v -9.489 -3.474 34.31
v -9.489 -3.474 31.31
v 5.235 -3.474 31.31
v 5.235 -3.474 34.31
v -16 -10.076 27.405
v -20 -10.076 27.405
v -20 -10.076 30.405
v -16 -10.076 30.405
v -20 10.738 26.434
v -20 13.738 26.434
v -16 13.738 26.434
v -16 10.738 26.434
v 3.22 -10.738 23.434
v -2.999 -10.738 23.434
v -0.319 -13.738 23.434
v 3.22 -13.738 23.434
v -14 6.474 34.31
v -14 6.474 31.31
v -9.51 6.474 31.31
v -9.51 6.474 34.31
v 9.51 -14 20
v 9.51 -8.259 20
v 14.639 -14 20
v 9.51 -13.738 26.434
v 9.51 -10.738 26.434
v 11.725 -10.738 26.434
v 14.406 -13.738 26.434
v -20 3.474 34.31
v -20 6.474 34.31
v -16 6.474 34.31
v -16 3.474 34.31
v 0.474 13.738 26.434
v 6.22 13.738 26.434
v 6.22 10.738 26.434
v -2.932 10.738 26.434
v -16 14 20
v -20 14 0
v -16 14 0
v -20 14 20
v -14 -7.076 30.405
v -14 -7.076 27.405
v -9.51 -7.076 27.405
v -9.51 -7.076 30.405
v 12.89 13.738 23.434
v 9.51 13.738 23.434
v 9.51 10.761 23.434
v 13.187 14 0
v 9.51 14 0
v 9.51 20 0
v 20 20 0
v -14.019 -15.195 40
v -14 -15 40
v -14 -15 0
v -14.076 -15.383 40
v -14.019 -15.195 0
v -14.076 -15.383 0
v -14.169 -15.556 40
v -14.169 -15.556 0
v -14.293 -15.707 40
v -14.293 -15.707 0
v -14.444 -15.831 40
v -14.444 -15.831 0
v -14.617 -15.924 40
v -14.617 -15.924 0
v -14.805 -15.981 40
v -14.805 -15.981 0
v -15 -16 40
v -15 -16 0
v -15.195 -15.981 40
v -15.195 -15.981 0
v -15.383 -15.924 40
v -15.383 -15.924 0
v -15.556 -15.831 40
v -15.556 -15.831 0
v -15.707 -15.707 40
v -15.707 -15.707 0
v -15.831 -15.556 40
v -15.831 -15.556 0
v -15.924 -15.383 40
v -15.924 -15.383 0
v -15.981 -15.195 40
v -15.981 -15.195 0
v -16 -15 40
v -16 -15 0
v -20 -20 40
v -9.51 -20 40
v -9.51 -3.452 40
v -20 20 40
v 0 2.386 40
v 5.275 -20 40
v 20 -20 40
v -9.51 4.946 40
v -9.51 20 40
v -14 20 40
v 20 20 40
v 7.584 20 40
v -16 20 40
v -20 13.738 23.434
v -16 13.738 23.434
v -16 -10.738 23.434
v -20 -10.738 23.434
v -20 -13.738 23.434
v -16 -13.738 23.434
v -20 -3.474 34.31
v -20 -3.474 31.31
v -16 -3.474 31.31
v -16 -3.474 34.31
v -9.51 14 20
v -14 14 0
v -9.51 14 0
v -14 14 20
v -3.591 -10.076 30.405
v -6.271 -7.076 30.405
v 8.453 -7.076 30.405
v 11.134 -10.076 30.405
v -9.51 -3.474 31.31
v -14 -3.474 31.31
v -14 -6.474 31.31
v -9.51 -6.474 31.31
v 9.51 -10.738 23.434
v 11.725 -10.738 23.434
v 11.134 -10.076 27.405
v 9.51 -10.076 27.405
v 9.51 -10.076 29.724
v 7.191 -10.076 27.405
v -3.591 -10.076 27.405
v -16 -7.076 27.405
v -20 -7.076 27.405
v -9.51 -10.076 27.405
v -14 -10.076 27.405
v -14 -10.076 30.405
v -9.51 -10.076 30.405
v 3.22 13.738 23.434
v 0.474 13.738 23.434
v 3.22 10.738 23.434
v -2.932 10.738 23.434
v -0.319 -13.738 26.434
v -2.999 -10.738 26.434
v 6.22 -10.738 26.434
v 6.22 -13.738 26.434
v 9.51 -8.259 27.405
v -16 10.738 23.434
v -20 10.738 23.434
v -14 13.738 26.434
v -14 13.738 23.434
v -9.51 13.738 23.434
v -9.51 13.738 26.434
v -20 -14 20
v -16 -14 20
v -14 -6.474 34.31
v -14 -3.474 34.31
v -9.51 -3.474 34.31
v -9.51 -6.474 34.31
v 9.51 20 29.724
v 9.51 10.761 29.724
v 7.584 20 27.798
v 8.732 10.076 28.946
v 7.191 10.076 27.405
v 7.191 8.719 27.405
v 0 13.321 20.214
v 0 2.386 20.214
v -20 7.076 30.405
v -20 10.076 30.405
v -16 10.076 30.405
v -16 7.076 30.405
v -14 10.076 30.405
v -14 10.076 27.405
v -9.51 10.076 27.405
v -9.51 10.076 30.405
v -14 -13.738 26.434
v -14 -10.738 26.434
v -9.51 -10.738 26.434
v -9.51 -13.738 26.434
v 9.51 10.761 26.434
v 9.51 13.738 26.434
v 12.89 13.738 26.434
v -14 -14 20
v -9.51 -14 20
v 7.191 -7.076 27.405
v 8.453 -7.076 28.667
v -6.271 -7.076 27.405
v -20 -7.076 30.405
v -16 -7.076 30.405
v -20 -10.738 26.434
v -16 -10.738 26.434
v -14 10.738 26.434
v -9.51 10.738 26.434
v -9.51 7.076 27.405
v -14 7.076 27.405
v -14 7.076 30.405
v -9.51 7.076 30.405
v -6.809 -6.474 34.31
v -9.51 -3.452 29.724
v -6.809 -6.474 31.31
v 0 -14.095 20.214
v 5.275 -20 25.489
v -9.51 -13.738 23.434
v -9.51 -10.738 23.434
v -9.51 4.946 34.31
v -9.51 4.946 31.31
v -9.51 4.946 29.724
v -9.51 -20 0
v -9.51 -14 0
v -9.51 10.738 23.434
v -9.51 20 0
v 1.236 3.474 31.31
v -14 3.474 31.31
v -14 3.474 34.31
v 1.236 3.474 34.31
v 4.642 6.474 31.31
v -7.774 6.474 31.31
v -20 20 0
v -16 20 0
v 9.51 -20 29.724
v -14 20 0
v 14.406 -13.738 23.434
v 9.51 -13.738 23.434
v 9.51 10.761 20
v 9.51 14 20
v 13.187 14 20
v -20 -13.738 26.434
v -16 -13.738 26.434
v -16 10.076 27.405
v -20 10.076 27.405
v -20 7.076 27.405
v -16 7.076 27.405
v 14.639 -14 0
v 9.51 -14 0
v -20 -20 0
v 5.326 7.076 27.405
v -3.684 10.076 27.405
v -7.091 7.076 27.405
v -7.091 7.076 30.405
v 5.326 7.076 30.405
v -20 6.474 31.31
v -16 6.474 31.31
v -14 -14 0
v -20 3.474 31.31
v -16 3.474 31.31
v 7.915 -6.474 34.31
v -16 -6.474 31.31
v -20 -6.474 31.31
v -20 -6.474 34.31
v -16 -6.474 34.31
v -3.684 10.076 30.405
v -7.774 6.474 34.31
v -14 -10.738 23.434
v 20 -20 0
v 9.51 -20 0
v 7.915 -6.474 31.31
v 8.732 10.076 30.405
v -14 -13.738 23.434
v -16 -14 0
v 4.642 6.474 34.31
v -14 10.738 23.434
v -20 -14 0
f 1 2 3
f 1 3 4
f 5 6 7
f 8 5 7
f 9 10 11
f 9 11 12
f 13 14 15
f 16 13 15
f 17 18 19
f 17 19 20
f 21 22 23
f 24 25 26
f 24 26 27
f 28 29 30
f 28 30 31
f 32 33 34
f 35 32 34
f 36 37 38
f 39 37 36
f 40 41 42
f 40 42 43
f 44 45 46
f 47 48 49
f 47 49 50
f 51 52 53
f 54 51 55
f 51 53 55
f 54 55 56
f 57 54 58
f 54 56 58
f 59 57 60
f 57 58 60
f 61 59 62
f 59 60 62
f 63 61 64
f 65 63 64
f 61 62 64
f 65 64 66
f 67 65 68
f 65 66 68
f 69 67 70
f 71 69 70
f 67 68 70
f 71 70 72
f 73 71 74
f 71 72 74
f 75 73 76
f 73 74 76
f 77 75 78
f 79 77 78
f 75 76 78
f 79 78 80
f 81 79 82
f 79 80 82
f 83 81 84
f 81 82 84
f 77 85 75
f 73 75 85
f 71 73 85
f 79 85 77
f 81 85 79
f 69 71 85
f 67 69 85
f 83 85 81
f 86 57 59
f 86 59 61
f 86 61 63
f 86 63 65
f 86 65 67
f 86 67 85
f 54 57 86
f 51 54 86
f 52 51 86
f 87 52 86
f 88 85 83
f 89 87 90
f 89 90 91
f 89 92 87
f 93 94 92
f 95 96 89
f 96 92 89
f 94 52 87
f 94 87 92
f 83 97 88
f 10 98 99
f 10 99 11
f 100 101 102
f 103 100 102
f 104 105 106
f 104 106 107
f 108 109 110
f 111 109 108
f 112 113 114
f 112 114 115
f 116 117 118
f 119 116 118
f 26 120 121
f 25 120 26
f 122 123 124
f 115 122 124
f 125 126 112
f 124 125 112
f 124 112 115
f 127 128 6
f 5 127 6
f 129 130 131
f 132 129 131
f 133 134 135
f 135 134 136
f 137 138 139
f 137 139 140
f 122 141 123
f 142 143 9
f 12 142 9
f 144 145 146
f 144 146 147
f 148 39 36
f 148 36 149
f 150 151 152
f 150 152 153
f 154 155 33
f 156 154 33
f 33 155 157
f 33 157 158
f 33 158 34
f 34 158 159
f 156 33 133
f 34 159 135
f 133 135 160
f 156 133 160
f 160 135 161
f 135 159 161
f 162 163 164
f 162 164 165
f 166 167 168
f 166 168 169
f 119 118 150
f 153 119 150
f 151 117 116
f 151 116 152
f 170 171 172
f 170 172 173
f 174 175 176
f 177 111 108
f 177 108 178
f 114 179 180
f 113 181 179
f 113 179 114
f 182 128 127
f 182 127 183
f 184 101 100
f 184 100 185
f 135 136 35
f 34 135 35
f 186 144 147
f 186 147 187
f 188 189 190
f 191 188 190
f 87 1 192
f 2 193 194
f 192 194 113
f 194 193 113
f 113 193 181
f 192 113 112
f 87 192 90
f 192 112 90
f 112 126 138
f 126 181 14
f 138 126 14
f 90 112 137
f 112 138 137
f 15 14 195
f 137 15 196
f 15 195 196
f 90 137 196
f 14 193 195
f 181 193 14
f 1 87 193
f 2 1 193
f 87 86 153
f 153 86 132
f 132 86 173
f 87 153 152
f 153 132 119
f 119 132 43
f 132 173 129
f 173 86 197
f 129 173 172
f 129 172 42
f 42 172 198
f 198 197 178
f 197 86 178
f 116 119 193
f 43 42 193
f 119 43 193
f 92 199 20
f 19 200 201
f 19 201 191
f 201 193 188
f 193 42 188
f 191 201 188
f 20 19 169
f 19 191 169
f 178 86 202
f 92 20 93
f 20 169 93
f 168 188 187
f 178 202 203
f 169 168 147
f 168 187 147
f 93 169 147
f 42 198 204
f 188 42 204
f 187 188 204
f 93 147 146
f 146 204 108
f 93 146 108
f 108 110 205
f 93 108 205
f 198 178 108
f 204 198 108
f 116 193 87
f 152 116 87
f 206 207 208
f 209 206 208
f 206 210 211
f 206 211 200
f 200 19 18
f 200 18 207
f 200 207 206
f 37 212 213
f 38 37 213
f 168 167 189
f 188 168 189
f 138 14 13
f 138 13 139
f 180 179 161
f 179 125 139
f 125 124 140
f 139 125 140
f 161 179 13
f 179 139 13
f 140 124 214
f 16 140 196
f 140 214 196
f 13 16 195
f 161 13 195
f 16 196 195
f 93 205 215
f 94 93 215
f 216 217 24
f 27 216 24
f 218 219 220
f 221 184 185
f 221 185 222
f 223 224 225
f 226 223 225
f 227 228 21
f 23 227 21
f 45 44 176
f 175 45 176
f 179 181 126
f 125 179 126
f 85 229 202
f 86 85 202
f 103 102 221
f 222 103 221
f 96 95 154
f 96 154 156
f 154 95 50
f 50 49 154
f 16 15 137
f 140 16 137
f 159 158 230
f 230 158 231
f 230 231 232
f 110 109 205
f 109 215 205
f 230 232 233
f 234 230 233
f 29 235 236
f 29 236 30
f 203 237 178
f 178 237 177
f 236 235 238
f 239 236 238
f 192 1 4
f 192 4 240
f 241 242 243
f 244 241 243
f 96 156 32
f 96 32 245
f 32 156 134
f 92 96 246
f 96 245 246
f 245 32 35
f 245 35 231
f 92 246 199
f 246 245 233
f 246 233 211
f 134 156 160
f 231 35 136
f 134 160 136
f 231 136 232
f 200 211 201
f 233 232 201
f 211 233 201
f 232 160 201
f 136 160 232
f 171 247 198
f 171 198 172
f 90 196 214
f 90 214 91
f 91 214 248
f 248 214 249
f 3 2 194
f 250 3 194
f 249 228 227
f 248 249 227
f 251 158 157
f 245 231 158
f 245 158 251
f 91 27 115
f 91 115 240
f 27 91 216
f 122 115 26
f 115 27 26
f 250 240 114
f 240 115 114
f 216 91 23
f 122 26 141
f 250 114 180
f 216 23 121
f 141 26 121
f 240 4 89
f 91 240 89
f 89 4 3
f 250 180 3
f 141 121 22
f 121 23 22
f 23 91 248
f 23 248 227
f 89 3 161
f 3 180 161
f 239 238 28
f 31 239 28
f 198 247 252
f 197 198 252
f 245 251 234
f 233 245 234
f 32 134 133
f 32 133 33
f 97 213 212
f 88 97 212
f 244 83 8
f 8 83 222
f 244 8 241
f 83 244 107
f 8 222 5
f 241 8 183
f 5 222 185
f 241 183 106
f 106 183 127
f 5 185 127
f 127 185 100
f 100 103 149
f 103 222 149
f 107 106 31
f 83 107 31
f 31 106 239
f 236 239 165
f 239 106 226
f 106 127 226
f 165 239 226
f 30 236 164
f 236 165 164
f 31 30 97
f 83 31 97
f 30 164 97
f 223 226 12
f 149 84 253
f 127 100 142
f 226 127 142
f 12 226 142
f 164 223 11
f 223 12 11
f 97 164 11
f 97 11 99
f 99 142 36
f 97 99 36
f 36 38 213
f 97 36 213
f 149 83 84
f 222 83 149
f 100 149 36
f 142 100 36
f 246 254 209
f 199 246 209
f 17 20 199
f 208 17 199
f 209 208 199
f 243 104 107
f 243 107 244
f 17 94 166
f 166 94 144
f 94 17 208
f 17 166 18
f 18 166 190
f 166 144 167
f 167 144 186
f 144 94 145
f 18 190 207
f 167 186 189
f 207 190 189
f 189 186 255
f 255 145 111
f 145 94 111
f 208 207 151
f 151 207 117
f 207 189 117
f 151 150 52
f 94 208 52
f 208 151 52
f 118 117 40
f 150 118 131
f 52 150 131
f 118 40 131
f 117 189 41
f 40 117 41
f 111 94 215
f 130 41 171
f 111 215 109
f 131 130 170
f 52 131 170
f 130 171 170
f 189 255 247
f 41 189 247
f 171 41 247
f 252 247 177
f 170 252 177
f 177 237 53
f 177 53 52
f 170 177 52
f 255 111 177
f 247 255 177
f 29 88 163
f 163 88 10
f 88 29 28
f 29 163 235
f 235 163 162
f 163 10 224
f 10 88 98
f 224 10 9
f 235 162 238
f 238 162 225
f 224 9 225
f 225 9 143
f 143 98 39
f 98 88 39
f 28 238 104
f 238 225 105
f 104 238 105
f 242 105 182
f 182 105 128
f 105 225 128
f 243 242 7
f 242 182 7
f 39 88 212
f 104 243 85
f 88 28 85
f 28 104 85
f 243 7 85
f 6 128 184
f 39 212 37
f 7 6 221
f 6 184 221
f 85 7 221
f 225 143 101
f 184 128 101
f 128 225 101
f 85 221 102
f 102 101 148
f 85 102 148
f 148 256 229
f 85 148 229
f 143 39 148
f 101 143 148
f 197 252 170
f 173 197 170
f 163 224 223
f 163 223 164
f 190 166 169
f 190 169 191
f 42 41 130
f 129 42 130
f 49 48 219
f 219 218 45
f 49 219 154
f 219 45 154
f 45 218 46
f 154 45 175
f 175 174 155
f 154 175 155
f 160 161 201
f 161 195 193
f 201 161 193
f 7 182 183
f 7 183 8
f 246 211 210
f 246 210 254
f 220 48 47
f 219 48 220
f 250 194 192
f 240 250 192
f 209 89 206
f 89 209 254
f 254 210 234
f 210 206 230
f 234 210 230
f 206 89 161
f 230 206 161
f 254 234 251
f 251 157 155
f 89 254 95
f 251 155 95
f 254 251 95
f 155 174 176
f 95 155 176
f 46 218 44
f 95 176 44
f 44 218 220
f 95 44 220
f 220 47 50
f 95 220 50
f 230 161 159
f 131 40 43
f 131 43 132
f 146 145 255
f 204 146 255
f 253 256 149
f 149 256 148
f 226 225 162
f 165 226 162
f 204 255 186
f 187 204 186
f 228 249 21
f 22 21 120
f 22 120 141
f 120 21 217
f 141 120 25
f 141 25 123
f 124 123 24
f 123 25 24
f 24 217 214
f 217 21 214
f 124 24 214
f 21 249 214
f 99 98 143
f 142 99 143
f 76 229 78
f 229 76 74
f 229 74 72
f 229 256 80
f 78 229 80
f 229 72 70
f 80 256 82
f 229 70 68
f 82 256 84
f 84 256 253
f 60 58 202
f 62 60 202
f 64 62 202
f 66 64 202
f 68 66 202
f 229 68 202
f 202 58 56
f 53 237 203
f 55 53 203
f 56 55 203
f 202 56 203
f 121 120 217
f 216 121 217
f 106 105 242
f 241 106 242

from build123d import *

# Parameters (mm, degrees)
F1_DEPTH = 40
F2_W     = 28
F2_H     = 20
F3_DEPTH = 40
F5_DEPTH = 40
F2_W_2   = 3
F2_H_2   = 3
F6_DEPTH = 40


with BuildPart() as f1:
    # F0 (on Top) → F1 (new body)
    with BuildSketch(Plane.XY):
        Polygon((0, 2.385549), (20, 20), (7.583665, 20), (-9.509563, 4.945609), (-9.509563, -3.451516), (5.275408, -20), (20, -20), align=None)
        with BuildLine():
            Line((-9.509563, 4.945609), (-9.509563, 20))
            Line((-9.509563, 20), (-14, 20))
            Line((-14, 20), (-14, -15))
            ThreePointArc((-14, -15), (-15, -16), (-16, -15))
            Line((-16, -15), (-16, 20))
            Line((-16, 20), (-20, 20))
            Line((-20, 20), (-20, -20))
            Line((-20, -20), (-9.509563, -20))
            Line((-9.509563, -20), (-9.509563, -3.451516))
            Line((-9.509563, -3.451516), (-9.509563, 4.945609))
        make_face()
    extrude(amount=F1_DEPTH)

    # F2 (on face) → F3 (cut)
    with BuildSketch(Plane(origin=(-20, 0, 0), x_dir=(0, -1, 0), z_dir=(-1, 0, 0))):
        with Locations((0, 10)):
            Rectangle(F2_W, F2_H)
    extrude(amount=-F3_DEPTH, mode=Mode.SUBTRACT)

    # F4 (on face) → F5 (cut)
    with BuildSketch(Plane.XZ.offset(20)):
        Polygon((9.509967, 29.723961), (0, 20.214196), (-9.509563, 29.723961), (-9.509563, 0), (9.509967, 0), align=None)
    extrude(amount=-F5_DEPTH, mode=Mode.SUBTRACT)

    # F2 (on face) → F6 (cut)
    with BuildSketch(Plane(origin=(-20, 0, 0), x_dir=(0, -1, 0), z_dir=(-1, 0, 0))):
        with Locations((-4.974076, 32.809951)):
            Rectangle(F2_W_2, F2_H_2)
        with Locations((4.974076, 32.809951)):
            Rectangle(F2_W_2, F2_H_2)
        with Locations((-8.575957, 28.904985)):
            Rectangle(F2_W_2, F2_H_2)
        with Locations((-12.238311, 24.934458)):
            Rectangle(F2_W_2, F2_H_2)
        with Locations((8.575957, 28.904985)):
            Rectangle(F2_W_2, F2_H_2)
        with Locations((12.238311, 24.934458)):
            Rectangle(F2_W_2, F2_H_2)
    extrude(amount=-F6_DEPTH, mode=Mode.SUBTRACT)


solid = f1.part
